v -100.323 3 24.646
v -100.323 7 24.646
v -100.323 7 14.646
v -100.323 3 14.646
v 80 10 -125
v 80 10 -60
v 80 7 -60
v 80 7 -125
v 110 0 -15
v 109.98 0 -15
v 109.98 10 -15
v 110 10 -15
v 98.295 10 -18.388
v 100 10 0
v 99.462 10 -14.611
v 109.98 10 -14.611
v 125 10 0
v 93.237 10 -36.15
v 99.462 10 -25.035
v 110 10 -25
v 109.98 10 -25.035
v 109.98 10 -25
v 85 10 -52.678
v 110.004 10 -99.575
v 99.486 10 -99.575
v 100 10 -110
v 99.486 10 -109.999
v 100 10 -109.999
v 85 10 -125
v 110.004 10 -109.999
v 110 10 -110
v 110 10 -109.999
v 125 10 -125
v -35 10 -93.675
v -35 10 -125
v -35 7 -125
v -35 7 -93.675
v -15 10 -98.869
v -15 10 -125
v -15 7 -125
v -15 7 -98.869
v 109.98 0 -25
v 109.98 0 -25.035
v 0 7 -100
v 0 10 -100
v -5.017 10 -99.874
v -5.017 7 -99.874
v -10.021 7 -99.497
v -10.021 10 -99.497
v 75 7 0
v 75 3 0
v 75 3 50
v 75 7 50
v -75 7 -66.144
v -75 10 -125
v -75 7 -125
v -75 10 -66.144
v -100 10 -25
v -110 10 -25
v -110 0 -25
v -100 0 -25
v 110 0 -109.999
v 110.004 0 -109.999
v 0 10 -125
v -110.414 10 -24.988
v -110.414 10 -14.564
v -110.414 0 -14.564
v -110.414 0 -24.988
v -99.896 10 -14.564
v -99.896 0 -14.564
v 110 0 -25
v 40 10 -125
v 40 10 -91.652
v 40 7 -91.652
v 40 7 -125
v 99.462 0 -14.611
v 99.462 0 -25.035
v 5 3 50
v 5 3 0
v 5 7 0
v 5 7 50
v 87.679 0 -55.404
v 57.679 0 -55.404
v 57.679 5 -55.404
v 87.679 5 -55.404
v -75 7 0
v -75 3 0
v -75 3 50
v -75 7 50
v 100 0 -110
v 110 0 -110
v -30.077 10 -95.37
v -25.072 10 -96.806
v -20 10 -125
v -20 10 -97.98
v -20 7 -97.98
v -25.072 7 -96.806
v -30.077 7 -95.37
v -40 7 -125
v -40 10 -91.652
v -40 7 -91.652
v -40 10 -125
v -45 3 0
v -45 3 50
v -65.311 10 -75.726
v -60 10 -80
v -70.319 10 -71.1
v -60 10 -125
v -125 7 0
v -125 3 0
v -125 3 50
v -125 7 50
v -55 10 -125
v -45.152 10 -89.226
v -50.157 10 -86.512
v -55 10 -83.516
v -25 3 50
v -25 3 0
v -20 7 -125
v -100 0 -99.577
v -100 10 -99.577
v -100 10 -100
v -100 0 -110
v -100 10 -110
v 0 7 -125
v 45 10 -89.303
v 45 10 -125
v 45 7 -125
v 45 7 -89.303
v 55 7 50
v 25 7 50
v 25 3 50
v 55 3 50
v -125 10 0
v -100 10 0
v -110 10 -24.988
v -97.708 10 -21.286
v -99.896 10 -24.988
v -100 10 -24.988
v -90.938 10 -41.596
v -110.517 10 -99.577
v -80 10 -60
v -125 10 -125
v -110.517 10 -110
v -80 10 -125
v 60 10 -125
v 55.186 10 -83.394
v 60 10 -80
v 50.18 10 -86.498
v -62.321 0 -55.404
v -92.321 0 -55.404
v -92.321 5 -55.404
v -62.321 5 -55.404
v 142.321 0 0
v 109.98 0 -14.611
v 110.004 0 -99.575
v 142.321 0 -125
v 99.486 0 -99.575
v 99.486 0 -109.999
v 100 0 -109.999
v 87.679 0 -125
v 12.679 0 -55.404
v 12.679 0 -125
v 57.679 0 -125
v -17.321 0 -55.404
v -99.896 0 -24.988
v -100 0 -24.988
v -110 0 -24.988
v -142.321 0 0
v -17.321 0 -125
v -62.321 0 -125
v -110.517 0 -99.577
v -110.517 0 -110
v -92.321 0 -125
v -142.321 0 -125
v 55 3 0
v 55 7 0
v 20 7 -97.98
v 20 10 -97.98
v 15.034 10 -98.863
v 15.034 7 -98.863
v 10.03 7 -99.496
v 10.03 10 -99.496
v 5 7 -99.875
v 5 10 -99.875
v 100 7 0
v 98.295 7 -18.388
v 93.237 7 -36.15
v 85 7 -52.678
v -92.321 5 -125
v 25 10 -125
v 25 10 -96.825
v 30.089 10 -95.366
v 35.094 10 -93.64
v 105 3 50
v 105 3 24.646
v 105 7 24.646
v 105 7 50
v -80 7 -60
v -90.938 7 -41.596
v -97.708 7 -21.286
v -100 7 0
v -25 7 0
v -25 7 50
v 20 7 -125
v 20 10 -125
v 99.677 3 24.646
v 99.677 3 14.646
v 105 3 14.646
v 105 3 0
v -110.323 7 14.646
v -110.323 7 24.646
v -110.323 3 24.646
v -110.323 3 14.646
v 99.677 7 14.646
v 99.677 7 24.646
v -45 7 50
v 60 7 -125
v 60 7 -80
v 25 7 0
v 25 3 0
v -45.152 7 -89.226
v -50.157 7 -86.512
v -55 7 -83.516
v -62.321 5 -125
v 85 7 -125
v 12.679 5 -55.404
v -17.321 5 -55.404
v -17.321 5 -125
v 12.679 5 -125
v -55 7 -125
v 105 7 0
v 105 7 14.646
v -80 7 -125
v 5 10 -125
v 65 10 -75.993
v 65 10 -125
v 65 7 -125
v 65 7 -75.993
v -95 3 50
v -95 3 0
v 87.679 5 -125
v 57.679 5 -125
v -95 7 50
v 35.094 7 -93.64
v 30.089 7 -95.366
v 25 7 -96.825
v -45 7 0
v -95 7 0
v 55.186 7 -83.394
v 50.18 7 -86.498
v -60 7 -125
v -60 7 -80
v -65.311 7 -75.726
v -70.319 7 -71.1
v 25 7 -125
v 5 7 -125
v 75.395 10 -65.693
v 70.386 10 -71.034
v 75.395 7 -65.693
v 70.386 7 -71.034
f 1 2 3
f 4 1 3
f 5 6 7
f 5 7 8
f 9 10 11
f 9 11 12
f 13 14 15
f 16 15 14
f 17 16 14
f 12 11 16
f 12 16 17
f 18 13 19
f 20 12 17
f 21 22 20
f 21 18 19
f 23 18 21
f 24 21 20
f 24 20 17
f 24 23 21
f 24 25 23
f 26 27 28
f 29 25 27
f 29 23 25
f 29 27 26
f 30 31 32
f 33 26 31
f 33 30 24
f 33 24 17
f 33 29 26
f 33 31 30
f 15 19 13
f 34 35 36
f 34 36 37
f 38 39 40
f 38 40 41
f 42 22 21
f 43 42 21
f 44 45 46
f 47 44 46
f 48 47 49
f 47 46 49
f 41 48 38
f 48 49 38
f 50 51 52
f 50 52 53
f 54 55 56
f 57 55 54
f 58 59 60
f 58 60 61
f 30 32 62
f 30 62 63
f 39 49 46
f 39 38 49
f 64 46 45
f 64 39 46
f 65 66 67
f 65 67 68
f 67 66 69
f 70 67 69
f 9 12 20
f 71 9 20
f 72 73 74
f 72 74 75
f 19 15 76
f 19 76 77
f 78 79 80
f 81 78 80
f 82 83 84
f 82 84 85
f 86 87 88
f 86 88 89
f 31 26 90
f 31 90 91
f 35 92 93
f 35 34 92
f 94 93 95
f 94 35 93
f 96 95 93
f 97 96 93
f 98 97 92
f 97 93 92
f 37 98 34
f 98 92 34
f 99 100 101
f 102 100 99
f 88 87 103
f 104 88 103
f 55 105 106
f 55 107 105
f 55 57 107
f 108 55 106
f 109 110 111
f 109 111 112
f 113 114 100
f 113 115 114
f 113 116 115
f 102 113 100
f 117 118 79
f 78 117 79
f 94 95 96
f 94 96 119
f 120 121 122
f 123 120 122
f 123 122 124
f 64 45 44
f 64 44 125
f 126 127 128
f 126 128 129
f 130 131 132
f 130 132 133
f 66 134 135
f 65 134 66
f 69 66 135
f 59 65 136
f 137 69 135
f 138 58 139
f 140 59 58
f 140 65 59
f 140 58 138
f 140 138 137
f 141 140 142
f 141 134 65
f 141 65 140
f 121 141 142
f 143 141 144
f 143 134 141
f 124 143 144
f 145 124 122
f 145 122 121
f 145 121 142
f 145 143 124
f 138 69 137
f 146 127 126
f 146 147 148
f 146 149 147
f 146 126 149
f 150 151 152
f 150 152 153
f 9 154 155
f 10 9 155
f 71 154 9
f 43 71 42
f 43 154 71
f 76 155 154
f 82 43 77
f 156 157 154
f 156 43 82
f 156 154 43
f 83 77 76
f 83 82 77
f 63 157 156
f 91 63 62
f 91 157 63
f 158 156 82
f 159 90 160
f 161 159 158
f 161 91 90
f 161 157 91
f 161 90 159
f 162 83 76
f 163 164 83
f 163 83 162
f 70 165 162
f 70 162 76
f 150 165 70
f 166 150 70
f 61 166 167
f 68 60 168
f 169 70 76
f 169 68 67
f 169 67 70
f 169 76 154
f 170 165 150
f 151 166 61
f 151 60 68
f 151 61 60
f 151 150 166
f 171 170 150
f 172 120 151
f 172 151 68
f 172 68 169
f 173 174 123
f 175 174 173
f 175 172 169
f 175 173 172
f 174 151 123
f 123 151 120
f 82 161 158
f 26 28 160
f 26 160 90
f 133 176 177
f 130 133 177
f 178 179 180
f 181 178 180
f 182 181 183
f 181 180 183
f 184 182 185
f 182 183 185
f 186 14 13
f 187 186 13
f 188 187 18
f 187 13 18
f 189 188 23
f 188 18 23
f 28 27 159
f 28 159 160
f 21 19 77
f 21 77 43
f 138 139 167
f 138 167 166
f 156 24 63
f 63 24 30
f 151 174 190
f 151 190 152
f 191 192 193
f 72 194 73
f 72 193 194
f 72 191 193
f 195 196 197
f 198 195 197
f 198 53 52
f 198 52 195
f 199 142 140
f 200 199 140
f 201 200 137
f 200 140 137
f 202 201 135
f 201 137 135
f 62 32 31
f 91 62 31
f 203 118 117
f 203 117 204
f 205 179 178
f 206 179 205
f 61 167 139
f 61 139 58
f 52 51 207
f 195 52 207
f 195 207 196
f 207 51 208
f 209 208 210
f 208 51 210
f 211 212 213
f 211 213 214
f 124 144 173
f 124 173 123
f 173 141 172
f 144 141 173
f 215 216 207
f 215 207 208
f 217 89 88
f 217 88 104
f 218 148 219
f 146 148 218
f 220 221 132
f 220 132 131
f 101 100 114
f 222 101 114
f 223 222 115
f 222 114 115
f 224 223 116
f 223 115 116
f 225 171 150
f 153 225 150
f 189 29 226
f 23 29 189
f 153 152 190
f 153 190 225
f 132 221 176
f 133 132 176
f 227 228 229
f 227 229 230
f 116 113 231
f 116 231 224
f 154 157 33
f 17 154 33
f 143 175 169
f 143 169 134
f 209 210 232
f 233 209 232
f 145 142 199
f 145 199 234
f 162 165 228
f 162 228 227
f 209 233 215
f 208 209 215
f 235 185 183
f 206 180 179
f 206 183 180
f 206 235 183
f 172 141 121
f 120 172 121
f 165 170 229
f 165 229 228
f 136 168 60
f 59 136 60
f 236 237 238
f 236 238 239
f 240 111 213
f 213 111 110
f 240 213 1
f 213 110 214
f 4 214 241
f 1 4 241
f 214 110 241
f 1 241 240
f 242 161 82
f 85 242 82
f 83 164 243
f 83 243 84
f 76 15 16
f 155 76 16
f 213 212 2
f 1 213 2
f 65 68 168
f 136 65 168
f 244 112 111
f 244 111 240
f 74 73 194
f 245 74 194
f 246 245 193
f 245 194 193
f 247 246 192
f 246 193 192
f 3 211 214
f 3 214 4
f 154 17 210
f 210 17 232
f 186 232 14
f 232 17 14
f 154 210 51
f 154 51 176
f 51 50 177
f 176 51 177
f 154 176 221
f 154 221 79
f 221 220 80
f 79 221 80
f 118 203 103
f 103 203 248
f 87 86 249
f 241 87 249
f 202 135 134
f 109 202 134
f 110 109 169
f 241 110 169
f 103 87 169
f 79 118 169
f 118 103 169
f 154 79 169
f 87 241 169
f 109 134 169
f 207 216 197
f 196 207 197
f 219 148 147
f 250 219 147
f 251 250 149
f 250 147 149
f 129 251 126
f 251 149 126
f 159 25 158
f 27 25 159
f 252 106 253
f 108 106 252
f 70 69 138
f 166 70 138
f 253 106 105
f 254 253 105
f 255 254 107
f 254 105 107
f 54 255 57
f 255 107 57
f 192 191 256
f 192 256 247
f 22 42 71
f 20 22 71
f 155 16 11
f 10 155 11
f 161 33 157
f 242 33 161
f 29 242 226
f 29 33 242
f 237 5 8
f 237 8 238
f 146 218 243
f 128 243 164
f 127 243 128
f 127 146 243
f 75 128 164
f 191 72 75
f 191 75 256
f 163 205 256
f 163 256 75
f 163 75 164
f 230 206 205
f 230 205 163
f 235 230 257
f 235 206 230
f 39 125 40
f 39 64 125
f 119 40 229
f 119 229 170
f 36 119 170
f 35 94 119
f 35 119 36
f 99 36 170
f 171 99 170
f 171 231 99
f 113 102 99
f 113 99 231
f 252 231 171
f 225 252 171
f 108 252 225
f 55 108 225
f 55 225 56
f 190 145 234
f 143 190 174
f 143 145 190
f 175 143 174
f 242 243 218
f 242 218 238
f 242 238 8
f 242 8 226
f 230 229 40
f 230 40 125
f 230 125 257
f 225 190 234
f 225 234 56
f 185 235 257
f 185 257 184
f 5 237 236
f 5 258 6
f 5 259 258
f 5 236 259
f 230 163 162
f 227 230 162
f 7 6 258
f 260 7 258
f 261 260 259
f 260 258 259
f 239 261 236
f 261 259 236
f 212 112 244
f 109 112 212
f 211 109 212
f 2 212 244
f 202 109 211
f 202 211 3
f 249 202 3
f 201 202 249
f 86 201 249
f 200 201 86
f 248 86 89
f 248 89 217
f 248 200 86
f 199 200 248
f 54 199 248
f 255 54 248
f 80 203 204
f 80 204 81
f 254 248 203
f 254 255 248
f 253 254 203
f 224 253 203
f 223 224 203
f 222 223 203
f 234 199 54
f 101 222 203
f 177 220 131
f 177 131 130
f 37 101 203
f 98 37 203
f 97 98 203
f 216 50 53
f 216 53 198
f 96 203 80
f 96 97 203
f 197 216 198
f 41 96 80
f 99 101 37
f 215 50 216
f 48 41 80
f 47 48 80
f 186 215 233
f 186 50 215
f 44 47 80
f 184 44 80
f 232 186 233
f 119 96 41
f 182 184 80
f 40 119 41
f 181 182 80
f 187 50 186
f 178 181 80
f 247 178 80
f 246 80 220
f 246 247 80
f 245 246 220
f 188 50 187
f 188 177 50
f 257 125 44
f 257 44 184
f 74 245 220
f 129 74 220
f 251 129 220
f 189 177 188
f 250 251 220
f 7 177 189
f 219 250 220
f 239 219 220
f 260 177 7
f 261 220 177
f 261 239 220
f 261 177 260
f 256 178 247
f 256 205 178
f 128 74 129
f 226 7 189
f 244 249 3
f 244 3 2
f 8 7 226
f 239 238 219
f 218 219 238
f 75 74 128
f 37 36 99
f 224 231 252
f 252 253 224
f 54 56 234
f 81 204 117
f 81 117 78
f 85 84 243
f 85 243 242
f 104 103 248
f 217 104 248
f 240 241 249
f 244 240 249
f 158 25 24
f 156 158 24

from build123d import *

# Parameters (mm, degrees)
SKETCH_1_W          = 250
SKETCH_1_H          = 125
EXTRUDE_1_DEPTH     = 10
SKETCH_5_W          = 10
SKETCH_5_H          = 10
CUT_EXTRUDE_1_DEPTH = 10
CUT_EXTRUDE_2_DEPTH = 3
SKETCH_8_W          = 30
SKETCH_8_H          = 4
EXTRUDE_2_DEPTH     = 50
SKETCH_11_W         = 10
SKETCH_11_H         = 10
CUT_EXTRUDE_4_DEPTH = 10
CUT_EXTRUDE_5_DEPTH = 3
EXTRUDE_3_DEPTH     = 125
SKETCH_14_W         = 30
SKETCH_14_H         = 69.595930906
CUT_EXTRUDE_6_DEPTH = 5
SKETCH_16_W         = 10.517397933
SKETCH_16_H         = 10.423374962
SKETCH_16_H_2       = 10.423374961
SKETCH_16_W_2       = 10.517397932
CUT_EXTRUDE_7_DEPTH = 190.684282477


with BuildPart() as part:
    # 草图1 → 凸台-拉伸1 (new body)
    with BuildSketch(Plane(origin=(0, 0, 0), x_dir=(1, 0, 0), z_dir=(0, 1, 0))):
        with Locations((0, 62.5)):
            Rectangle(SKETCH_1_W, SKETCH_1_H)
    extrude(amount=EXTRUDE_1_DEPTH)

    # 草图5 → 切除-拉伸1 (cut)
    with BuildSketch(Plane(origin=(0, 10, 0), x_dir=(1, 0, 0), z_dir=(0, 1, 0))):
        with Locations((-105, 105)):
            Rectangle(SKETCH_5_W, SKETCH_5_H)
        with Locations((-105, 20)):
            Rectangle(SKETCH_5_W, SKETCH_5_H)
        with Locations((105, 105)):
            Rectangle(SKETCH_5_W, SKETCH_5_H)
        with Locations((105, 20)):
            Rectangle(SKETCH_5_W, SKETCH_5_H)
    extrude(amount=-CUT_EXTRUDE_1_DEPTH, mode=Mode.SUBTRACT)

    # 草图6 → 切除-拉伸2 (cut)
    with BuildSketch(Plane(origin=(0, 10, 0), x_dir=(1, 0, 0), z_dir=(0, 1, 0))):
        with BuildLine():
            Line((-100, 0), (100, 0))
            ThreePointArc((100, 0), (0, 100), (-100, 0))
        make_face()
    extrude(amount=-CUT_EXTRUDE_2_DEPTH, mode=Mode.SUBTRACT)

    # 草图8 → 凸台-拉伸2 (add)
    with BuildSketch(Plane.XY):
        with Locations((-110, 5)):
            Rectangle(SKETCH_8_W, SKETCH_8_H)
        with Locations((-60, 5)):
            Rectangle(SKETCH_8_W, SKETCH_8_H)
        with Locations((-10, 5)):
            Rectangle(SKETCH_8_W, SKETCH_8_H)
        with Locations((40, 5)):
            Rectangle(SKETCH_8_W, SKETCH_8_H)
        with Locations((90, 5)):
            Rectangle(SKETCH_8_W, SKETCH_8_H)
    extrude(amount=EXTRUDE_2_DEPTH)

    # 草图11 → 切除-拉伸4 (cut)
    with BuildSketch(Plane(origin=(0, 10, 0), x_dir=(1, 0, 0), z_dir=(0, 1, 0))):
        Polygon((104.677013389, -14.646181821), (112.233893295, -14.646181821), (112.233893295, -24.646181821), (104.677013389, -24.646181821), (99.677013389, -24.646181821), (99.677013389, -14.646181821), align=None)
        with Locations((-105.322986611, -19.646181821)):
            Rectangle(SKETCH_11_W, SKETCH_11_H)
    extrude(amount=-CUT_EXTRUDE_4_DEPTH, mode=Mode.SUBTRACT)

    # 草图12 → 切除-拉伸5 (cut)
    with BuildSketch(Plane(origin=(0, 10, 0), x_dir=(1, 0, 0), z_dir=(0, 1, 0))):
        with BuildLine():
            Line((-80, 131.028694586), (-75, 131.028694586))
            Line((-75, 131.028694586), (-75, 66.143782777))
            ThreePointArc((-75, 66.143782777), (-77.560856859, 63.121418578), (-80, 60))
            Line((-80, 60), (-80, 131.028694586))
        make_face()
        with BuildLine():
            Line((85, 131.028694586), (85, 52.678268764))
            ThreePointArc((85, 52.678268764), (82.581183917, 56.394574765), (80, 60))
            Line((80, 60), (80, 131.028694586))
            Line((80, 131.028694586), (85, 131.028694586))
        make_face()
        with BuildLine():
            Line((65, 131.028694586), (65, 75.993420768))
            ThreePointArc((65, 75.993420768), (62.532097112, 78.036765891), (60, 80))
            Line((60, 80), (60, 131.028694586))
            Line((60, 131.028694586), (65, 131.028694586))
        make_face()
        with BuildLine():
            Line((45, 131.028694586), (45, 89.302855497))
            ThreePointArc((45, 89.302855497), (42.516221011, 90.511717202), (40, 91.651513899))
            Line((40, 91.651513899), (40, 131.028694586))
            Line((40, 131.028694586), (45, 131.028694586))
        make_face()
        with BuildLine():
            Line((25, 131.028694586), (25, 96.824583655))
            ThreePointArc((25, 96.824583655), (22.507410108, 97.434164903), (20, 97.979589711))
            Line((20, 97.979589711), (20, 131.028694586))
            Line((20, 131.028694586), (25, 131.028694586))
        make_face()
        with BuildLine():
            Line((5, 131.028694586), (5, 99.874921777))
            ThreePointArc((5, 99.874921777), (2.500782106, 99.968725554), (0, 100))
            Line((0, 100), (0, 131.028694586))
            Line((0, 131.028694586), (5, 131.028694586))
        make_face()
        with BuildLine():
            Line((-15, 131.028694586), (-15, 98.868599666))
            ThreePointArc((-15, 98.868599666), (-17.505644366, 98.455839925), (-20, 97.979589711))
            Line((-20, 97.979589711), (-20, 131.028694586))
            Line((-20, 131.028694586), (-15, 131.028694586))
        make_face()
        with BuildLine():
            Line((-35, 131.028694586), (-35, 93.674969976))
            ThreePointArc((-35, 93.674969976), (-37.513645432, 92.696960071), (-40, 91.651513899))
            Line((-40, 91.651513899), (-40, 131.028694586))
            Line((-40, 131.028694586), (-35, 131.028694586))
        make_face()
        with BuildLine():
            Line((-55, 131.028694586), (-55, 83.516465442))
            ThreePointArc((-55, 83.516465442), (-57.526875305, 81.796446241), (-60, 80))
            Line((-60, 80), (-60, 131.028694586))
            Line((-60, 131.028694586), (-55, 131.028694586))
        make_face()
    extrude(amount=-CUT_EXTRUDE_5_DEPTH, mode=Mode.SUBTRACT)

    # 草图13 → 凸台-拉伸3 (add)
    with BuildSketch(Plane(origin=(0, 0, -125), x_dir=(-1, 0, 0), z_dir=(0, 0, -1))):
        Polygon((125, 10), (125, 0), (142.320508076, 0), align=None)
        Polygon((-125, 10), (-125, 0), (-142.320508076, 0), align=None)
    extrude(amount=-EXTRUDE_3_DEPTH)

    # 草图14 → 切除-拉伸6 (cut)
    with BuildSketch(Plane.XZ):
        with Locations((-77.320508076, -90.202034547)):
            Rectangle(SKETCH_14_W, SKETCH_14_H)
        with Locations((-2.320508076, -90.202034547)):
            Rectangle(SKETCH_14_W, SKETCH_14_H)
        with Locations((72.679491924, -90.202034547)):
            Rectangle(SKETCH_14_W, SKETCH_14_H)
    extrude(amount=-CUT_EXTRUDE_6_DEPTH, mode=Mode.SUBTRACT)

    # 草图16 → 切除-拉伸7 (cut, through all)
    with BuildSketch(Plane(origin=(0, 10, 0), x_dir=(1, 0, 0), z_dir=(0, 1, 0))):
        with Locations((-105.258698967, 104.788312519)):
            Rectangle(SKETCH_16_W, SKETCH_16_H)
        with Locations((104.720979462, 19.822994084)):
            Rectangle(SKETCH_16_W, SKETCH_16_H_2)
        with Locations((-105.154924979, 19.775983857)):
            Rectangle(SKETCH_16_W_2, SKETCH_16_H)
        with Locations((104.744997222, 104.787129461)):
            Rectangle(SKETCH_16_W, SKETCH_16_H)
    extrude(amount=-CUT_EXTRUDE_7_DEPTH, mode=Mode.SUBTRACT)


solid = part.part
